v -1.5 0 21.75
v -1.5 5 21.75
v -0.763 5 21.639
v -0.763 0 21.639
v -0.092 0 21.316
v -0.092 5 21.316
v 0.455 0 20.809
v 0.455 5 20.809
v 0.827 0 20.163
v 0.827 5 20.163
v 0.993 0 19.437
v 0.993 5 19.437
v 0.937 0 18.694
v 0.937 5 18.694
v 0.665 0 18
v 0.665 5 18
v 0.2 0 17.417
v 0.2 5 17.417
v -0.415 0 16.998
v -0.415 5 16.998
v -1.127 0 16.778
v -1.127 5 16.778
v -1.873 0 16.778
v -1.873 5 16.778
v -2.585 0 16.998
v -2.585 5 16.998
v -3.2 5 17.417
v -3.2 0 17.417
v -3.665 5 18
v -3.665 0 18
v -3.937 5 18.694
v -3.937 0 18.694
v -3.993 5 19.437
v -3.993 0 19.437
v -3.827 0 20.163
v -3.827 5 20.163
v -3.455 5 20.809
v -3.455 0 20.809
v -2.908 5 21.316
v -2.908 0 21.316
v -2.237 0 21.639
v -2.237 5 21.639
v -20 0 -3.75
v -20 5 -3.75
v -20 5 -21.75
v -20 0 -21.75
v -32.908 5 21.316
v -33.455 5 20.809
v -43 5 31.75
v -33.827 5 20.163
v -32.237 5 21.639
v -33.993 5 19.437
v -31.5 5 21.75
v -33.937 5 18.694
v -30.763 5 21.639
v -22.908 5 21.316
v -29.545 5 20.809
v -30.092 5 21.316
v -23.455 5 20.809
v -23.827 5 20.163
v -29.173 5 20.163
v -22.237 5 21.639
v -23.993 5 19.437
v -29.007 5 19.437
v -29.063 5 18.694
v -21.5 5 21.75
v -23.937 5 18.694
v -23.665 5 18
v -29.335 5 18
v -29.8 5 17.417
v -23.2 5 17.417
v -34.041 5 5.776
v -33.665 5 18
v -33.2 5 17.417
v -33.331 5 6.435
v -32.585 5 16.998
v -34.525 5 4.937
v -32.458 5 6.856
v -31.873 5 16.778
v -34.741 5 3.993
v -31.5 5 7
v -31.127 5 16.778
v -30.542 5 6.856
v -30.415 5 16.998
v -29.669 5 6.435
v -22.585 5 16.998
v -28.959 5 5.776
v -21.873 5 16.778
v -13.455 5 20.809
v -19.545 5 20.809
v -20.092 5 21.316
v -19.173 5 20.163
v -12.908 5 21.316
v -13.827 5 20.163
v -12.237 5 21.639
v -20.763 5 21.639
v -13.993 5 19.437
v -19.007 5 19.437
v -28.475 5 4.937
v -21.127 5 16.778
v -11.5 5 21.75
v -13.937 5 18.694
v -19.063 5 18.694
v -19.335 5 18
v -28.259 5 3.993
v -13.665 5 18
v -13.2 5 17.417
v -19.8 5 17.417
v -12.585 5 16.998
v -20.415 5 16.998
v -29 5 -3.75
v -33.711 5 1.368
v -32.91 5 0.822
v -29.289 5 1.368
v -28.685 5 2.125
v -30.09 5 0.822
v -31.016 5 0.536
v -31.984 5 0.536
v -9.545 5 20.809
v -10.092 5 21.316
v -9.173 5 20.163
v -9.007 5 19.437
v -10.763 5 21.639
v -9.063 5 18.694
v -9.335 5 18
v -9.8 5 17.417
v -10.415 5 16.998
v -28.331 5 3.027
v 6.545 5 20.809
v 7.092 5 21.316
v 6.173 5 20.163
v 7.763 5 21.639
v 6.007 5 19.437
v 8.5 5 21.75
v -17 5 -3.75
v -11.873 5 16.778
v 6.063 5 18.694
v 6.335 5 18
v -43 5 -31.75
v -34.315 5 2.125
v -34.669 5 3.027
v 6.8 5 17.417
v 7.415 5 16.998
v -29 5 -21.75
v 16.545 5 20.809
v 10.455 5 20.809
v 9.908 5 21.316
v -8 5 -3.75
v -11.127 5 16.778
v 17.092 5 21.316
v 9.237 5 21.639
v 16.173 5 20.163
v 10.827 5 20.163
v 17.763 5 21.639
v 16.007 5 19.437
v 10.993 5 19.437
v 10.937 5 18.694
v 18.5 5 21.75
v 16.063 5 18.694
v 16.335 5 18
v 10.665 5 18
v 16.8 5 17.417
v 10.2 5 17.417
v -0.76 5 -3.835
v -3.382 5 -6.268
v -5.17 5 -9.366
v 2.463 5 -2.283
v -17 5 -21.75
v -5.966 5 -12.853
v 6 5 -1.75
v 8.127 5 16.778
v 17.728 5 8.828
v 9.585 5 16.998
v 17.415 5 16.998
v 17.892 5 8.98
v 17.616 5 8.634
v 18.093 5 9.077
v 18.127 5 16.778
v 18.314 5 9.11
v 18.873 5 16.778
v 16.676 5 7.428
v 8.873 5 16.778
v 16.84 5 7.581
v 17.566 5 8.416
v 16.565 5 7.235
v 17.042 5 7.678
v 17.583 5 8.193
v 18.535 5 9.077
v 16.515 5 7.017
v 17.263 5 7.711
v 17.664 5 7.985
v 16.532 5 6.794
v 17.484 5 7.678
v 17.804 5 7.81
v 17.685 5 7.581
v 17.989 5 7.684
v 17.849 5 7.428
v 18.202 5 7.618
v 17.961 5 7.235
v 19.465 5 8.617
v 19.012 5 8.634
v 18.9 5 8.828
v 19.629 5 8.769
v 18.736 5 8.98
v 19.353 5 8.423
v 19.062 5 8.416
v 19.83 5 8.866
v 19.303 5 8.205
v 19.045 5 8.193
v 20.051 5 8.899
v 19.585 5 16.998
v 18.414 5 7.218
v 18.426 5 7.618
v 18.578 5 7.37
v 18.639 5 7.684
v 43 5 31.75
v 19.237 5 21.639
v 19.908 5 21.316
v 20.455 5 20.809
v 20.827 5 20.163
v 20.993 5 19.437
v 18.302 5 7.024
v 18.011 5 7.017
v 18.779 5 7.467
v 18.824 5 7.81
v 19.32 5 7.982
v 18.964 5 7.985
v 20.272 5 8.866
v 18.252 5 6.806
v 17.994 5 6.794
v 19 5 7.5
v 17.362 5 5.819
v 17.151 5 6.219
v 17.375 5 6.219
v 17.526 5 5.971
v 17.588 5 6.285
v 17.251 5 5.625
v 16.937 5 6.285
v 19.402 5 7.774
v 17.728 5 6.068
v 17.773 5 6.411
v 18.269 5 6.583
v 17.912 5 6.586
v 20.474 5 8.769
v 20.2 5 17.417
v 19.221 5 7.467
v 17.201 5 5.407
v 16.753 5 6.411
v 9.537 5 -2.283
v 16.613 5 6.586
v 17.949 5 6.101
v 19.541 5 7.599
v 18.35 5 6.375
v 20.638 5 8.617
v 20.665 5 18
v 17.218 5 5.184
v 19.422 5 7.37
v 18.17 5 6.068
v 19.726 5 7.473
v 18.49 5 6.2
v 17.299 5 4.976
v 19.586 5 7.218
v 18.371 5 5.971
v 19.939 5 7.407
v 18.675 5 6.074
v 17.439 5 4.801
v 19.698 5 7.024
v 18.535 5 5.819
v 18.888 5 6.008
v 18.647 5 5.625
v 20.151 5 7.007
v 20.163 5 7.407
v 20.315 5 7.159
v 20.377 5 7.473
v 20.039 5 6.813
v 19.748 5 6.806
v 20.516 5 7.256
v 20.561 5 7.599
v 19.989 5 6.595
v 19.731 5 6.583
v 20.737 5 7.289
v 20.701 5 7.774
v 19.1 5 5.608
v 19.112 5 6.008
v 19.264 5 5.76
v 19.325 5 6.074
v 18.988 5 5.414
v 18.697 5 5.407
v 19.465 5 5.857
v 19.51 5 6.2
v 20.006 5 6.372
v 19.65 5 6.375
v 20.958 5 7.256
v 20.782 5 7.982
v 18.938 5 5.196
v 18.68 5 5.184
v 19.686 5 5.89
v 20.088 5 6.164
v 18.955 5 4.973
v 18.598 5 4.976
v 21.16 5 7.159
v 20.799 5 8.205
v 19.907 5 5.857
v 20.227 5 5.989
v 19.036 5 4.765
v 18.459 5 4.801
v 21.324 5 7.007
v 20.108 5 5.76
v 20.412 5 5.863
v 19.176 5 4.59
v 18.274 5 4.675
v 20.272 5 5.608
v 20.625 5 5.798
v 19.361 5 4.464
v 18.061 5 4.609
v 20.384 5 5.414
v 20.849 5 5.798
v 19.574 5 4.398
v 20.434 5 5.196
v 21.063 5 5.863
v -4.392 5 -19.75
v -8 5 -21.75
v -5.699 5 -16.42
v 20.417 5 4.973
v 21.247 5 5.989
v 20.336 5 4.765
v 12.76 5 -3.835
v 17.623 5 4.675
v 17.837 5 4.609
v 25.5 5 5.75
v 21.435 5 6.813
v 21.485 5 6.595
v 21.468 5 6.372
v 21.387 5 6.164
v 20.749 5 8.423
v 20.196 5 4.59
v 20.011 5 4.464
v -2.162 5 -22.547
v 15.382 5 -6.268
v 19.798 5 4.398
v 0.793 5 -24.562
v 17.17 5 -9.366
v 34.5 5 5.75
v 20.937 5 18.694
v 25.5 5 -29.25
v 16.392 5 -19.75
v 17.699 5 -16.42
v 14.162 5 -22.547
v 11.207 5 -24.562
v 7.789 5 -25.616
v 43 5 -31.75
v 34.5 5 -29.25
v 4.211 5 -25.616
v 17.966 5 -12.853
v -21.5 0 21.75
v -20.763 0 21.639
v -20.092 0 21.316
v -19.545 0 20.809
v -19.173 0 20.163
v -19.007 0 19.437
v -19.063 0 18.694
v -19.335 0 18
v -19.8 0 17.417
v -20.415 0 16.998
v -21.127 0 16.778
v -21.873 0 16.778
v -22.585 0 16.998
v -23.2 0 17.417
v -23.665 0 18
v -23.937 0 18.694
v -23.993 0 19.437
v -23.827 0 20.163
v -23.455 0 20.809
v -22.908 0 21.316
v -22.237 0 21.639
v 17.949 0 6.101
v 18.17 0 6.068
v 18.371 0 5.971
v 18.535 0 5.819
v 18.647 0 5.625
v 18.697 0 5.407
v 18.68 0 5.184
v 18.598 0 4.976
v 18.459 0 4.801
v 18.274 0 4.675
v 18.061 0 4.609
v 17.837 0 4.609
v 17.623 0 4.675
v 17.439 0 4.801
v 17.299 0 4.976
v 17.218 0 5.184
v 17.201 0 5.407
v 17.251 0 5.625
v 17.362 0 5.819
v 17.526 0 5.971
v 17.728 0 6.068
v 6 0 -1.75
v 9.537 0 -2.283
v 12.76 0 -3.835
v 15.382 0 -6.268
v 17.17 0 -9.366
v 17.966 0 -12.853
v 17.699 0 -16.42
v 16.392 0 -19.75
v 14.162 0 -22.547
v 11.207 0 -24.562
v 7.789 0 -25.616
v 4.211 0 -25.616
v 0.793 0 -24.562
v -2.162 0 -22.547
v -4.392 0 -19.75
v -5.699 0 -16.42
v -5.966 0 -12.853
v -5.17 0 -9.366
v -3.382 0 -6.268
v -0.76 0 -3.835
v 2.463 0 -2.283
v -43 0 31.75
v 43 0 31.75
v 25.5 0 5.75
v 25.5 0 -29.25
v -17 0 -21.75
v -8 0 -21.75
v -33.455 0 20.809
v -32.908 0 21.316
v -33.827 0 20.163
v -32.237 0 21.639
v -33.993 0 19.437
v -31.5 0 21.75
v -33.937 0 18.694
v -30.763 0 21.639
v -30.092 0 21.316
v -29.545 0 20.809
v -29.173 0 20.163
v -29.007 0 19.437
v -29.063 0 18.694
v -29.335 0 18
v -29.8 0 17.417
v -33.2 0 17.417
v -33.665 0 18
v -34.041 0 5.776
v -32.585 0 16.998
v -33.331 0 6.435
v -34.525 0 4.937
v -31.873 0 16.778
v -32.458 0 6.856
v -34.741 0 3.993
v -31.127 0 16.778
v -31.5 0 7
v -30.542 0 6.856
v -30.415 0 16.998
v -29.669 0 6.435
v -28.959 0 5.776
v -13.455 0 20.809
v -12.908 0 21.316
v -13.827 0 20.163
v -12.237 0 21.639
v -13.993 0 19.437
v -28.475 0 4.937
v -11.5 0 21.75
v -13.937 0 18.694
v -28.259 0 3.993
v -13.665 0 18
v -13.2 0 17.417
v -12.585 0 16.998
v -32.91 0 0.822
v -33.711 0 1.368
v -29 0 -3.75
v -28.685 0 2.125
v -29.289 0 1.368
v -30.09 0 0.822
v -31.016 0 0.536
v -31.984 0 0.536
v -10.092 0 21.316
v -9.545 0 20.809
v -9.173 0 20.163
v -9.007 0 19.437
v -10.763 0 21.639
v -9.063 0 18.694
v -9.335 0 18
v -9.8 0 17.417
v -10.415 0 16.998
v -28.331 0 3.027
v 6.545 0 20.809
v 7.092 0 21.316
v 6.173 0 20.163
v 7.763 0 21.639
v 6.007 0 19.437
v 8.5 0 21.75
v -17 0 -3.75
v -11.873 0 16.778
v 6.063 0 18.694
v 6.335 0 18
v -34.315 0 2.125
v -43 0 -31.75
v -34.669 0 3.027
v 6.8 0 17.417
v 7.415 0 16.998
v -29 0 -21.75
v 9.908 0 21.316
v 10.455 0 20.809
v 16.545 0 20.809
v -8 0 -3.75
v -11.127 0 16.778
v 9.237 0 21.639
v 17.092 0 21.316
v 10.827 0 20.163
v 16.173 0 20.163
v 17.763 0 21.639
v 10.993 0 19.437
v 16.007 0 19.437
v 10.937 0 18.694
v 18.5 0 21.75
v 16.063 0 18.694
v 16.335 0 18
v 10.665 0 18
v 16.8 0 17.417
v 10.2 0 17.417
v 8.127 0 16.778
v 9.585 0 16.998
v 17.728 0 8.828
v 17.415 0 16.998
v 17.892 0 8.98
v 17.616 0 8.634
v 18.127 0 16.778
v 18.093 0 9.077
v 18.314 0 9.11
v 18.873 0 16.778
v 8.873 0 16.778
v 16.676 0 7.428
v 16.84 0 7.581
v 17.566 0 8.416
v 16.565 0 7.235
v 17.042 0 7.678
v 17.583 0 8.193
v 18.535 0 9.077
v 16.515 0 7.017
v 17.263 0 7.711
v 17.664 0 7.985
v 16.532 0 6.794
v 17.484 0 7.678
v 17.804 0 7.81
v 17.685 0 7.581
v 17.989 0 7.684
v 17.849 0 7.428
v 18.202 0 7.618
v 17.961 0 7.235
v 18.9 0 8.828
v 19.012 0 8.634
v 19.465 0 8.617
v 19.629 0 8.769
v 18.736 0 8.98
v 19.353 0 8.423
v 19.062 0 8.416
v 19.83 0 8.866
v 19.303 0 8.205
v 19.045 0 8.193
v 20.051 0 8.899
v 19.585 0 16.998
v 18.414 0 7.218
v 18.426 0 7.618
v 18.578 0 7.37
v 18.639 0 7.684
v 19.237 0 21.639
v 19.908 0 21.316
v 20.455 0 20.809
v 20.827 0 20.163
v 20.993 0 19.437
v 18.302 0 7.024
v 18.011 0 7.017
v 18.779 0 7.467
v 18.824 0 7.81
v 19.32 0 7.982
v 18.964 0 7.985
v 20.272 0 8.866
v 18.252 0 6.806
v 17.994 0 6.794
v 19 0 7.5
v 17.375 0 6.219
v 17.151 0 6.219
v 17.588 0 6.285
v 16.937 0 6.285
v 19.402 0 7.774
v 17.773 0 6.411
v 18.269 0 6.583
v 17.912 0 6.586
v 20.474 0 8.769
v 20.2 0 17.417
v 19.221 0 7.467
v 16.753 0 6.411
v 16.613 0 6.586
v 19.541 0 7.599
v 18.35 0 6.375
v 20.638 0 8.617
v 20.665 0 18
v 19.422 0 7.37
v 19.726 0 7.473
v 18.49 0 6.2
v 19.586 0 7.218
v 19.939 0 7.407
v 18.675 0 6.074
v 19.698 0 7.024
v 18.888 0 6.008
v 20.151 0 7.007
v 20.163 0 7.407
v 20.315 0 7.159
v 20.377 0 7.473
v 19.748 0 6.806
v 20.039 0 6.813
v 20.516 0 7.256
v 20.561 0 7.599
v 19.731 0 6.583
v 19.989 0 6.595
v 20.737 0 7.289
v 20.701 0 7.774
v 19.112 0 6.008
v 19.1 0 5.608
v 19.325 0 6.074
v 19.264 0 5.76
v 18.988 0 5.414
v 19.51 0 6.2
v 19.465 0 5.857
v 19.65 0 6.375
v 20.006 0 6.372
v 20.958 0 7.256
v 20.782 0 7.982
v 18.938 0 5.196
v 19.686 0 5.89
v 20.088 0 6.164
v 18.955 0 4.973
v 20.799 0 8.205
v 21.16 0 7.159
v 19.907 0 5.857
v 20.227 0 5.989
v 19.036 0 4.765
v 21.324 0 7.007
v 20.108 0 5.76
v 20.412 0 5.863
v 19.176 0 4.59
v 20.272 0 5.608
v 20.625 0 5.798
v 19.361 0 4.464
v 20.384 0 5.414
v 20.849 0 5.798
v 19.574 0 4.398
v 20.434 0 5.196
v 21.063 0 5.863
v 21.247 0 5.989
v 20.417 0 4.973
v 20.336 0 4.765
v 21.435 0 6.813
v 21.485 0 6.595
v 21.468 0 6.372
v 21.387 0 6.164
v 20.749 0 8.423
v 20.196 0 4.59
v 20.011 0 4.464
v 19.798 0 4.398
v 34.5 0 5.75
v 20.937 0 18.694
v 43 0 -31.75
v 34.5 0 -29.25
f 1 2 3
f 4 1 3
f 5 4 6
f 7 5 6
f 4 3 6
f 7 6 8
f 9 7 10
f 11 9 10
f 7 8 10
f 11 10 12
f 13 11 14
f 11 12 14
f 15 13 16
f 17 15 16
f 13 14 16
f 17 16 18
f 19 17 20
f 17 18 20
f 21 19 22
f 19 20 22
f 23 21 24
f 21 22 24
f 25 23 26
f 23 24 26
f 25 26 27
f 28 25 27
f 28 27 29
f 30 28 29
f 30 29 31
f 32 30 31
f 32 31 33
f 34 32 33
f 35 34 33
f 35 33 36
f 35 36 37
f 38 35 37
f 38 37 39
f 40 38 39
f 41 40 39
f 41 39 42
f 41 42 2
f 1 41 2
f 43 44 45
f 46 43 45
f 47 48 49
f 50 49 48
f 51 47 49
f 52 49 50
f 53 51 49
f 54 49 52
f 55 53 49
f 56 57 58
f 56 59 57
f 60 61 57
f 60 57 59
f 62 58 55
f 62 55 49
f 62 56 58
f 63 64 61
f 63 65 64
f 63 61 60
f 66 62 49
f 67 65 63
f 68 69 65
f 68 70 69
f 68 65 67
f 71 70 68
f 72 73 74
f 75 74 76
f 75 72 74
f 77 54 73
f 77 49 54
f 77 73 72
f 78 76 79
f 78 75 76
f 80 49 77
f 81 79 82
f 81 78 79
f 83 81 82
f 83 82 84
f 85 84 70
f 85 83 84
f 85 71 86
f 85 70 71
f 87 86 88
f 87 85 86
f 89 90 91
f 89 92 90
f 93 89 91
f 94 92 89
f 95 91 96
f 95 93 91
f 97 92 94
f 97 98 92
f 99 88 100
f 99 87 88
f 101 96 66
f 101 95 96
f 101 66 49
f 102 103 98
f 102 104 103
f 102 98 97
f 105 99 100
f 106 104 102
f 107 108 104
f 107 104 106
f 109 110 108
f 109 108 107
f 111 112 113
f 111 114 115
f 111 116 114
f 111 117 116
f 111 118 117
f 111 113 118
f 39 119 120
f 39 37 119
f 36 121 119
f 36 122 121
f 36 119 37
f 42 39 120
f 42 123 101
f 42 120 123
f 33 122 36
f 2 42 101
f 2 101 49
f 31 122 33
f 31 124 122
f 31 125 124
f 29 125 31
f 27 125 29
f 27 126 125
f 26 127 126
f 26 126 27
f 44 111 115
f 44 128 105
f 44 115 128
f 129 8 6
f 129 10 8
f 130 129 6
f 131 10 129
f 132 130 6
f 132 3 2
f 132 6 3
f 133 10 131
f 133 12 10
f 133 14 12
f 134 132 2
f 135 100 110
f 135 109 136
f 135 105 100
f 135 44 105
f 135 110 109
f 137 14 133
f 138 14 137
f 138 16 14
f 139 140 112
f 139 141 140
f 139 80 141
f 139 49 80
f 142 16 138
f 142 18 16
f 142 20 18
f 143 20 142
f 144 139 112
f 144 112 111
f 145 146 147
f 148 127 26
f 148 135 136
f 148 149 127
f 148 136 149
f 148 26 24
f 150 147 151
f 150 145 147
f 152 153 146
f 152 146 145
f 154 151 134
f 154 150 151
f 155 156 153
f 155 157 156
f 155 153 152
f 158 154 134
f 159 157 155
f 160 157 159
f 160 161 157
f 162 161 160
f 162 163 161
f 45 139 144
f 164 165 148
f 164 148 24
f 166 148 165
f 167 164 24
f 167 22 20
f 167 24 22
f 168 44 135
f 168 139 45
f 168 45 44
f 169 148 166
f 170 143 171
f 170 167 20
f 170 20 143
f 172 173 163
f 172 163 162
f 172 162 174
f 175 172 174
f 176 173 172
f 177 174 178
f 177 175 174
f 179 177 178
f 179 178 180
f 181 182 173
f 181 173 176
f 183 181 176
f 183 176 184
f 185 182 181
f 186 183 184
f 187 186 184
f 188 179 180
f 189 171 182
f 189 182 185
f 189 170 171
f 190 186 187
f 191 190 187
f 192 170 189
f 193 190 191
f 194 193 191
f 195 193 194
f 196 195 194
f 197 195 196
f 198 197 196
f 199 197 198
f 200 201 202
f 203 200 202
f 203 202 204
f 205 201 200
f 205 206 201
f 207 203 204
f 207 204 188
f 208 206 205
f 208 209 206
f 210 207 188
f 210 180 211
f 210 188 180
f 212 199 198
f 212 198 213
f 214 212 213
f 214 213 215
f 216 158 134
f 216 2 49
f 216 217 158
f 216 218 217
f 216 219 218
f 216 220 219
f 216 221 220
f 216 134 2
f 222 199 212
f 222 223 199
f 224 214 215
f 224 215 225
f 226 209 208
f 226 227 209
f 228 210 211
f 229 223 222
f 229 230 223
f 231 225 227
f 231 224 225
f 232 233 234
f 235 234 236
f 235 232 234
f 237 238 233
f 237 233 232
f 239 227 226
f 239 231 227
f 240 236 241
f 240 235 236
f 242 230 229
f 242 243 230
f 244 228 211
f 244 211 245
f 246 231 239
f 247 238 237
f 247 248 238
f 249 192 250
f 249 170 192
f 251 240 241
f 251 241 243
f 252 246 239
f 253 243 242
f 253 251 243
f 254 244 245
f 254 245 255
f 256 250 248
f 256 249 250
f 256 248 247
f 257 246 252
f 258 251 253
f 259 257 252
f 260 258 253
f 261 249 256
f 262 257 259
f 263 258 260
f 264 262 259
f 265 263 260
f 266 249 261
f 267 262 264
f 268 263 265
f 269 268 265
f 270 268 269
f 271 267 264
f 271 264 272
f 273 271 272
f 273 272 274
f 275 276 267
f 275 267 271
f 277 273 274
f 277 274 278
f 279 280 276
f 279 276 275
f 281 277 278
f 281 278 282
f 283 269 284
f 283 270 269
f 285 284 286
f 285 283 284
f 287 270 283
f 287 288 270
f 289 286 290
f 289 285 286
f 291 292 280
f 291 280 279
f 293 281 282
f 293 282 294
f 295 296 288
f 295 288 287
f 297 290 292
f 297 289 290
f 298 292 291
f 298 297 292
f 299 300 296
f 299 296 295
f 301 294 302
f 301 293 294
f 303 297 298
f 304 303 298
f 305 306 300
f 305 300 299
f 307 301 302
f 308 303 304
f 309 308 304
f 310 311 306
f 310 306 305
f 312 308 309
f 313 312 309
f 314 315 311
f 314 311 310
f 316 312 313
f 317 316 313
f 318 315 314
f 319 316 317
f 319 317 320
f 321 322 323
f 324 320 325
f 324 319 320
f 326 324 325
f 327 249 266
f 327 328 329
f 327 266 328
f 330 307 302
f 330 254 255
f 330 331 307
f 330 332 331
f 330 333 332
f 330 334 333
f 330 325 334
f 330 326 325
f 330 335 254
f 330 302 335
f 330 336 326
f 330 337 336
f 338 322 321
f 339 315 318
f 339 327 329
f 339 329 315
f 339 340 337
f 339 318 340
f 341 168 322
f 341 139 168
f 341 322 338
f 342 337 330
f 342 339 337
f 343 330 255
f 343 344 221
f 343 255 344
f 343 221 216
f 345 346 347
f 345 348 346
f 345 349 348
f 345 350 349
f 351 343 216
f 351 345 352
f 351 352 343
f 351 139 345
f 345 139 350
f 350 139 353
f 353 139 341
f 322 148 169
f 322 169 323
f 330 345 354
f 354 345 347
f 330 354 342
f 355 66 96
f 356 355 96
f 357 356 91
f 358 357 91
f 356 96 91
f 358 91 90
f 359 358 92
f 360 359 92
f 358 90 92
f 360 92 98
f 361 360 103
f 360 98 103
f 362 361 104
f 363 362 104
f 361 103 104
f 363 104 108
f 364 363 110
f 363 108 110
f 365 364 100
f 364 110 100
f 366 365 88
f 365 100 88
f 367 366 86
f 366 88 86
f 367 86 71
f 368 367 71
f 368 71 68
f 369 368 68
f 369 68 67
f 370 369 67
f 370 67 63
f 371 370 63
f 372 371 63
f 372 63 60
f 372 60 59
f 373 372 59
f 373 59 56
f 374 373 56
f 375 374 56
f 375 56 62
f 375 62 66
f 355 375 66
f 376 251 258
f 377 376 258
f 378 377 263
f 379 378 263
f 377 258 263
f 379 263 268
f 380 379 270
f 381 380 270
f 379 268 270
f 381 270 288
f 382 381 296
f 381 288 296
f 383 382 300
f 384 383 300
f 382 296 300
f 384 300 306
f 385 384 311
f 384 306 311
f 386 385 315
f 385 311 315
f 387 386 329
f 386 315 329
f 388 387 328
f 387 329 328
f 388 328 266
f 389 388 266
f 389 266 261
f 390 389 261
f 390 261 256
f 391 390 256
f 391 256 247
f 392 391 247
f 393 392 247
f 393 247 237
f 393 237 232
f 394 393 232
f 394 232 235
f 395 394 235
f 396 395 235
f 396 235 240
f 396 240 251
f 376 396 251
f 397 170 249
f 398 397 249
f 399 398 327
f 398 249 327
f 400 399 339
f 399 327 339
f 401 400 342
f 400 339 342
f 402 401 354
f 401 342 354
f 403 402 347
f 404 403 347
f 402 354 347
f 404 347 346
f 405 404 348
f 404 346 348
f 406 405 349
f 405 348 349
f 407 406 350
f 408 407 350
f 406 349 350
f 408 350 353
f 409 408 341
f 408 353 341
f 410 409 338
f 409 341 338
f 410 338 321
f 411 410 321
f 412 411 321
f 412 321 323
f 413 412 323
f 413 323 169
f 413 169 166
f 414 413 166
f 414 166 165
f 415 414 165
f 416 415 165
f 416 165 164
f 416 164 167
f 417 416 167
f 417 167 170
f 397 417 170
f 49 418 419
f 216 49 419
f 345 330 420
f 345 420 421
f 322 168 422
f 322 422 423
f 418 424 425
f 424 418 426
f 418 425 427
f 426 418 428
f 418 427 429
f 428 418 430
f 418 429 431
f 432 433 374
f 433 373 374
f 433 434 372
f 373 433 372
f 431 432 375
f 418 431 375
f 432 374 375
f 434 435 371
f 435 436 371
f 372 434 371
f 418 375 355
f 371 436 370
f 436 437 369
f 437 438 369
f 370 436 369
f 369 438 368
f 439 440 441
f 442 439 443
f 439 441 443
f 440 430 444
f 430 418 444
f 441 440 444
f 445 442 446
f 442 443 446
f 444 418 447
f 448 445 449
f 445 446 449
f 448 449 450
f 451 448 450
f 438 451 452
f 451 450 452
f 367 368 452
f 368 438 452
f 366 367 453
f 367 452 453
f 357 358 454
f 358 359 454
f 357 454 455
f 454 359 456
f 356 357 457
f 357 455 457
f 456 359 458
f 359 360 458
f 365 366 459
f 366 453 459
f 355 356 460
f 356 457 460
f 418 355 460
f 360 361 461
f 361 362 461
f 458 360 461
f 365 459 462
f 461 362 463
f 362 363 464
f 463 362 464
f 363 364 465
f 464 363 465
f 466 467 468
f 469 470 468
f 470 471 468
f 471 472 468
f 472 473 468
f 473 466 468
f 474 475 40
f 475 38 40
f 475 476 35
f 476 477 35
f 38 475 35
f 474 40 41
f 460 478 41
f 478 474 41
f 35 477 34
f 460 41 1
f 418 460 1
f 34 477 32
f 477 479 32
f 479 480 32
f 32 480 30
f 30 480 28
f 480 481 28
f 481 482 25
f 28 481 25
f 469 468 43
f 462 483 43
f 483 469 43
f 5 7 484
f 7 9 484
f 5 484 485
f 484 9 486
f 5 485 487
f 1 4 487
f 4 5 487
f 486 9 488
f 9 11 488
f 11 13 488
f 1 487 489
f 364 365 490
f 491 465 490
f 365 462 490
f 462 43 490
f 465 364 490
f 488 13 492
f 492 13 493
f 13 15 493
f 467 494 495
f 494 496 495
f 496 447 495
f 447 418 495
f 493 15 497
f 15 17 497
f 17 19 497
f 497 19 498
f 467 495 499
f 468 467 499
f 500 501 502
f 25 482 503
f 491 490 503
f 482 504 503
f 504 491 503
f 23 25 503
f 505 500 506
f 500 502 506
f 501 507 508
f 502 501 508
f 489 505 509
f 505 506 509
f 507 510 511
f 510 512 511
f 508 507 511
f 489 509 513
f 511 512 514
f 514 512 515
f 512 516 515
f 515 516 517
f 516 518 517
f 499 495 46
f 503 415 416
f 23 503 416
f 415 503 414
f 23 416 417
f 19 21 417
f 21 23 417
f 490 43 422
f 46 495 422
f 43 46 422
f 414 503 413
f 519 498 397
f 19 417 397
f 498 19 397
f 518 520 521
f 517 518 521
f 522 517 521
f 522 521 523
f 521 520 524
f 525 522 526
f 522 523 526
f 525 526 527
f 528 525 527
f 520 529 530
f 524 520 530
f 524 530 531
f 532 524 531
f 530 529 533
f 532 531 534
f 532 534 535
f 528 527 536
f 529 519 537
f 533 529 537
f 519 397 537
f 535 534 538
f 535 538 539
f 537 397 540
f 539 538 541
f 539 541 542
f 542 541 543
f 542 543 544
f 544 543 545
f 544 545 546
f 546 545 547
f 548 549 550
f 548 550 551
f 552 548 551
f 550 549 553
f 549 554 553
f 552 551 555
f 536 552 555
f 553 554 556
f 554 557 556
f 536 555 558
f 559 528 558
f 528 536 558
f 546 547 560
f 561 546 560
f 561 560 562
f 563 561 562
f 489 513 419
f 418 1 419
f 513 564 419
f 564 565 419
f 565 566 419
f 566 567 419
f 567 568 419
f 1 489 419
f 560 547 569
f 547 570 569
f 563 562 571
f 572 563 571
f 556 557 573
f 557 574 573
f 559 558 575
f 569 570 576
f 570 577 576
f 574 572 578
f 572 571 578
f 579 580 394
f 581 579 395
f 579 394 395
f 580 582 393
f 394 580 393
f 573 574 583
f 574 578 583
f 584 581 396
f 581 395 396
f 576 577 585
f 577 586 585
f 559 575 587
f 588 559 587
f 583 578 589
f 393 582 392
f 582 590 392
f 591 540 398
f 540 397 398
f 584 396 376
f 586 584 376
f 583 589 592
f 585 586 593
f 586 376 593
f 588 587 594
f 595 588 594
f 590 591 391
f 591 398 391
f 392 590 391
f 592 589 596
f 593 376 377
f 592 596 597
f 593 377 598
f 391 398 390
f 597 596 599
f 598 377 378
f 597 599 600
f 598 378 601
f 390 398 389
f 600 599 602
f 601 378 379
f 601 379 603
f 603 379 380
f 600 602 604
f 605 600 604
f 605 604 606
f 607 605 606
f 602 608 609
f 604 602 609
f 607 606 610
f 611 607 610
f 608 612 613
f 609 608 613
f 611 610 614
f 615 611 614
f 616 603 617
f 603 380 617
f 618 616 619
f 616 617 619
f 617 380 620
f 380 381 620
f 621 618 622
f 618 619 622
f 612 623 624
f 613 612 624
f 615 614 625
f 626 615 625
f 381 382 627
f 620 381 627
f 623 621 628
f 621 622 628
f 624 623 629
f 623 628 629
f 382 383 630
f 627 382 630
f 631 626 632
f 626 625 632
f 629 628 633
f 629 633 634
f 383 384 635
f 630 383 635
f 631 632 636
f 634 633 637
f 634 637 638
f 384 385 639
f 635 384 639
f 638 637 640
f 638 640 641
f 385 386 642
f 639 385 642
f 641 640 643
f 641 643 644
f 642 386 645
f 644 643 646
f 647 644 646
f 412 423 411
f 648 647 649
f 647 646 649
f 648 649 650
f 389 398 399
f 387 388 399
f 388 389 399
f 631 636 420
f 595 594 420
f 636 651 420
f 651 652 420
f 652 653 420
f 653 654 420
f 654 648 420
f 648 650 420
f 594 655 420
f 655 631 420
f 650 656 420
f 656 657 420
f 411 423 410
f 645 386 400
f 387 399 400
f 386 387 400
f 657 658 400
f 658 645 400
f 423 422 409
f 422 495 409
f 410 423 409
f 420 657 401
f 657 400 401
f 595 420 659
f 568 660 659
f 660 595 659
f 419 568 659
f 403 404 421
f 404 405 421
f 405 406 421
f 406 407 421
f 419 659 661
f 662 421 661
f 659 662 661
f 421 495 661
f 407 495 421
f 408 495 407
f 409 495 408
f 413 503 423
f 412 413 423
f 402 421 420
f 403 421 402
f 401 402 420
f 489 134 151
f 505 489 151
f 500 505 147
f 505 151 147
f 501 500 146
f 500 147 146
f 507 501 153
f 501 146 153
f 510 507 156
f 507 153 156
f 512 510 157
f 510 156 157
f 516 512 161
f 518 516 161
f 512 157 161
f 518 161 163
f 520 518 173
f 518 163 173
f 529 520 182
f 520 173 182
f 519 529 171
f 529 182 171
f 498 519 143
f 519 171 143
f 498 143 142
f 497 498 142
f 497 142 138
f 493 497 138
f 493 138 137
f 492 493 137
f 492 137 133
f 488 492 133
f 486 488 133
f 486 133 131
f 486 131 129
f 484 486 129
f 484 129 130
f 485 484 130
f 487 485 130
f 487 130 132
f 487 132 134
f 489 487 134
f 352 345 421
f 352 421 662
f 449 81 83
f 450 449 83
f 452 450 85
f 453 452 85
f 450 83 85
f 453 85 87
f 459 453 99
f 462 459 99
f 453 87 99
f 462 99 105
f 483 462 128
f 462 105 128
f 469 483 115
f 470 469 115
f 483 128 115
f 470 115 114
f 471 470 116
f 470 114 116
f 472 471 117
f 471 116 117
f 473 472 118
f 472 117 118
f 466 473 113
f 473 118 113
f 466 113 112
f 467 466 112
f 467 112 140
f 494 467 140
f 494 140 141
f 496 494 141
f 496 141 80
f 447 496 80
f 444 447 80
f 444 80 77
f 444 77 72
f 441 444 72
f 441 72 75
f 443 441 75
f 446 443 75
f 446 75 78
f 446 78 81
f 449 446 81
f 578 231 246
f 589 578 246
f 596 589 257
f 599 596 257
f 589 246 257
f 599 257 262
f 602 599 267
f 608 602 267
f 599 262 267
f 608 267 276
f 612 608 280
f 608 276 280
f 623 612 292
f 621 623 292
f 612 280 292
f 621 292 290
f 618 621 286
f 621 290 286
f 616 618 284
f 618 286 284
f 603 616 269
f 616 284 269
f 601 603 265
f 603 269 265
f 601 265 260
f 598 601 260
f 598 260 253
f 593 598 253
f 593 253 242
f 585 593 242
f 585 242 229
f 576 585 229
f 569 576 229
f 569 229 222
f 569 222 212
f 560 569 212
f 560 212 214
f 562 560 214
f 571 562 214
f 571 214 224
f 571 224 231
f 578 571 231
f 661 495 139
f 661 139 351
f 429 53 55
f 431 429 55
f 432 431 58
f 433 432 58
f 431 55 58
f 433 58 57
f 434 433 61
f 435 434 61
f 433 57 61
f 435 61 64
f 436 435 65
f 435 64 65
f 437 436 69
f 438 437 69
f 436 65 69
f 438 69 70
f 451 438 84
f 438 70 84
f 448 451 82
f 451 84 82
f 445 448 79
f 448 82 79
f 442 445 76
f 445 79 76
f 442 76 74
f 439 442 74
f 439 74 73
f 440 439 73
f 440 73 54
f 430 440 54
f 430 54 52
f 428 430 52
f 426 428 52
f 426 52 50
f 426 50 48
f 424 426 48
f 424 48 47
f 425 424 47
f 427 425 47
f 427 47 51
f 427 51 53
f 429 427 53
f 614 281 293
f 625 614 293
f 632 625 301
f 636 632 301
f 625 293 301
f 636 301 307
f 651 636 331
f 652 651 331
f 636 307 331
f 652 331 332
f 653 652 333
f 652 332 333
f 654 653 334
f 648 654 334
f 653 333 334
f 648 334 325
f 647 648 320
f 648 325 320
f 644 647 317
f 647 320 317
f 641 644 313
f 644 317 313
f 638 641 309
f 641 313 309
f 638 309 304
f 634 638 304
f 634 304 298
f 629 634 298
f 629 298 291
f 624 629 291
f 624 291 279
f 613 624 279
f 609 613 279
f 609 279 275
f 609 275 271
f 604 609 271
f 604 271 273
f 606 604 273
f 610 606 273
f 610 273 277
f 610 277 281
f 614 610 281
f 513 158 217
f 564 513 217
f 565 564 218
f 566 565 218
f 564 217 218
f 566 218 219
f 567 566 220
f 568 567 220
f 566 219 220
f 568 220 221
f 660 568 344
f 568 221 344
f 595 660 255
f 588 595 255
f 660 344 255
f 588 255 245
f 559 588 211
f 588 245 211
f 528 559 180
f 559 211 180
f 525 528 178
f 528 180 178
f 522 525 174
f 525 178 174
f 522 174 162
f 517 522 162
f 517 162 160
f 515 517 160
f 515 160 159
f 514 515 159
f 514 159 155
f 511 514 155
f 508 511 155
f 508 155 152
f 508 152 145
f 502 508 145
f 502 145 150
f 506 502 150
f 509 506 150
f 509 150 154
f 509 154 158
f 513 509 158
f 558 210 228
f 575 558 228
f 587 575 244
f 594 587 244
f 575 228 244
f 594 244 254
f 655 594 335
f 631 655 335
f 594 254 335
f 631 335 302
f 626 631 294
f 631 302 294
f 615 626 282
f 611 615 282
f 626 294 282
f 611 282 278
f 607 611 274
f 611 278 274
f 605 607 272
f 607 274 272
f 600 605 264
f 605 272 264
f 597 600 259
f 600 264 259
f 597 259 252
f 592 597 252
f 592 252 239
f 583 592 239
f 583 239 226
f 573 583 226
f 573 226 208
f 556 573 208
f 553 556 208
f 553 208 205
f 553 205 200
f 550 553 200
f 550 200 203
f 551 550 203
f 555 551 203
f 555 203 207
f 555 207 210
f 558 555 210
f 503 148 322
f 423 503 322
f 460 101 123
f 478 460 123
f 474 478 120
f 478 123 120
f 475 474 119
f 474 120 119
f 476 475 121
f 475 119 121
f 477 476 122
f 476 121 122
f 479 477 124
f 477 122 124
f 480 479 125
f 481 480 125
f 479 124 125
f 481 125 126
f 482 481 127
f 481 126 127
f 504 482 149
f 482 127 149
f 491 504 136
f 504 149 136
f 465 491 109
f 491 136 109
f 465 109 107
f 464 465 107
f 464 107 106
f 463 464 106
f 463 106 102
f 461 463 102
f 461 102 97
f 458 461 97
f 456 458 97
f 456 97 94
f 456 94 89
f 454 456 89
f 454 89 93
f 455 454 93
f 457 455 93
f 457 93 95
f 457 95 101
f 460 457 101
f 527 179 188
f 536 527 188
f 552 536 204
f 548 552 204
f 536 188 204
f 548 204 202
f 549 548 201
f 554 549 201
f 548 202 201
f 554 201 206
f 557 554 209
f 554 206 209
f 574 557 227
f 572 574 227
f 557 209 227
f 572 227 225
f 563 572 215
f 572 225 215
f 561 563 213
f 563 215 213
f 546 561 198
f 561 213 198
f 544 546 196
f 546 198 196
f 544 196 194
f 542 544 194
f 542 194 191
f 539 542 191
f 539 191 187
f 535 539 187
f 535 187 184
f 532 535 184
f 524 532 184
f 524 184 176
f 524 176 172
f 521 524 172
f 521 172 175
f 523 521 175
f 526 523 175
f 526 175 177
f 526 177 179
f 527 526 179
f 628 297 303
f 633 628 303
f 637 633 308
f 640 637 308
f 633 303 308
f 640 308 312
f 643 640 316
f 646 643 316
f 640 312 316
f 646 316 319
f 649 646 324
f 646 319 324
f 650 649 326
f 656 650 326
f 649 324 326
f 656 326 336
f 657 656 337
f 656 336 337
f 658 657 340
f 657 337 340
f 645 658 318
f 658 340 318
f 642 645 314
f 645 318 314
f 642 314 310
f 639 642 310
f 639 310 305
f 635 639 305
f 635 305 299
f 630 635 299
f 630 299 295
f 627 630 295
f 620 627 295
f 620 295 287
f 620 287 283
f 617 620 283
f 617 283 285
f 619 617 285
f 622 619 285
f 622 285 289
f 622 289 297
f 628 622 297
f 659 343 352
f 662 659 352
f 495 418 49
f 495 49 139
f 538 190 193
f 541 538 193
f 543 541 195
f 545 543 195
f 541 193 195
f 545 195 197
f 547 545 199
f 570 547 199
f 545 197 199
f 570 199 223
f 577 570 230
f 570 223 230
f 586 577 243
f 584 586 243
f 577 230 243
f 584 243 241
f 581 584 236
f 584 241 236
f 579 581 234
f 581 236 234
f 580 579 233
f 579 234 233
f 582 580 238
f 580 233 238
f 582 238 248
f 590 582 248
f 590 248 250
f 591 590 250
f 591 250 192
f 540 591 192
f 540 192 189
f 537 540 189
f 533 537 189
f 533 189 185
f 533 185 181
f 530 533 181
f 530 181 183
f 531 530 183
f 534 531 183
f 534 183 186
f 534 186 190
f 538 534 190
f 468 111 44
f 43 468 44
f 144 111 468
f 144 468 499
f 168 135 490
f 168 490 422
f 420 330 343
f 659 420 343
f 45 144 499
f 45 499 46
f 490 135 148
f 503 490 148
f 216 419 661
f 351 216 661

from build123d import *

# Parameters (mm, degrees)
SKICA2_W                 = 86
SKICA2_H                 = 63.5
P_IDAT_VYSUNUT_M1_DEPTH  = 5
ODEBRAT_VYSUNUT_M1_REACH = 55.685
SKICA4_R                 = 2.5
SKICA4_R_2               = 3.25
SKICA4_R_3               = 12
SKICA4_R_4               = 0.75
SKICA4_W                 = 9
SKICA4_H                 = 18
SKICA4_H_2               = 35


with BuildPart() as part:
    # Skica2 → Přidat vysunutím1 (new body)
    with BuildSketch(Plane(origin=(0, 0, 0), x_dir=(1, 0, 0), z_dir=(0, 1, 0))):
        Rectangle(SKICA2_W, SKICA2_H)
    extrude(amount=P_IDAT_VYSUNUT_M1_DEPTH)

    # Skica4 → Odebrat vysunutím1 (cut, up to next)
    with BuildSketch(Plane(origin=(0, 5, 0), x_dir=(1, 0, 0), z_dir=(0, 1, 0)), mode=Mode.PRIVATE) as odebrat_vysunut_m1_sk1:
        with Locations(Location((-31.5, -19.25, 0), (0, 0, 270))):
            Circle(SKICA4_R)
    odebrat_vysunut_m1_tool1 = extrude(odebrat_vysunut_m1_sk1.sketch, amount=-ODEBRAT_VYSUNUT_M1_REACH, mode=Mode.PRIVATE) & part.part
    # Skica4 → Odebrat vysunutím1 (cut, up to next)
    with BuildSketch(Plane(origin=(0, 5, 0), x_dir=(1, 0, 0), z_dir=(0, 1, 0)), mode=Mode.PRIVATE) as odebrat_vysunut_m1_sk2:
        with Locations(Location((-21.5, -19.25, 0), (0, 0, 270))):
            Circle(SKICA4_R)
    odebrat_vysunut_m1_tool2 = extrude(odebrat_vysunut_m1_sk2.sketch, amount=-ODEBRAT_VYSUNUT_M1_REACH, mode=Mode.PRIVATE) & part.part
    # Skica4 → Odebrat vysunutím1 (cut, up to next)
    with BuildSketch(Plane(origin=(0, 5, 0), x_dir=(1, 0, 0), z_dir=(0, 1, 0)), mode=Mode.PRIVATE) as odebrat_vysunut_m1_sk3:
        with Locations(Location((-11.5, -19.25, 0), (0, 0, 270))):
            Circle(SKICA4_R)
    odebrat_vysunut_m1_tool3 = extrude(odebrat_vysunut_m1_sk3.sketch, amount=-ODEBRAT_VYSUNUT_M1_REACH, mode=Mode.PRIVATE) & part.part
    # Skica4 → Odebrat vysunutím1 (cut, up to next)
    with BuildSketch(Plane(origin=(0, 5, 0), x_dir=(1, 0, 0), z_dir=(0, 1, 0)), mode=Mode.PRIVATE) as odebrat_vysunut_m1_sk4:
        with Locations(Location((-1.5, -19.25, 0), (0, 0, 270))):
            Circle(SKICA4_R)
    odebrat_vysunut_m1_tool4 = extrude(odebrat_vysunut_m1_sk4.sketch, amount=-ODEBRAT_VYSUNUT_M1_REACH, mode=Mode.PRIVATE) & part.part
    # Skica4 → Odebrat vysunutím1 (cut, up to next)
    with BuildSketch(Plane(origin=(0, 5, 0), x_dir=(1, 0, 0), z_dir=(0, 1, 0)), mode=Mode.PRIVATE) as odebrat_vysunut_m1_sk5:
        with Locations(Location((8.5, -19.25, 0), (0, 0, 270))):
            Circle(SKICA4_R)
    odebrat_vysunut_m1_tool5 = extrude(odebrat_vysunut_m1_sk5.sketch, amount=-ODEBRAT_VYSUNUT_M1_REACH, mode=Mode.PRIVATE) & part.part
    # Skica4 → Odebrat vysunutím1 (cut, up to next)
    with BuildSketch(Plane(origin=(0, 5, 0), x_dir=(1, 0, 0), z_dir=(0, 1, 0)), mode=Mode.PRIVATE) as odebrat_vysunut_m1_sk6:
        with Locations(Location((18.5, -19.25, 0), (0, 0, 270))):
            Circle(SKICA4_R)
    odebrat_vysunut_m1_tool6 = extrude(odebrat_vysunut_m1_sk6.sketch, amount=-ODEBRAT_VYSUNUT_M1_REACH, mode=Mode.PRIVATE) & part.part
    # Skica4 → Odebrat vysunutím1 (cut, up to next)
    with BuildSketch(Plane(origin=(0, 5, 0), x_dir=(1, 0, 0), z_dir=(0, 1, 0)), mode=Mode.PRIVATE) as odebrat_vysunut_m1_sk7:
        with Locations(Location((-31.5, -3.75, 0), (0, 0, 270))):
            Circle(SKICA4_R_2)
    odebrat_vysunut_m1_tool7 = extrude(odebrat_vysunut_m1_sk7.sketch, amount=-ODEBRAT_VYSUNUT_M1_REACH, mode=Mode.PRIVATE) & part.part
    # Skica4 → Odebrat vysunutím1 (cut, up to next)
    with BuildSketch(Plane(origin=(0, 5, 0), x_dir=(1, 0, 0), z_dir=(0, 1, 0)), mode=Mode.PRIVATE) as odebrat_vysunut_m1_sk8:
        with Locations(Location((6, 13.75, 0), (0, 0, 270))):
            Circle(SKICA4_R_3)
    odebrat_vysunut_m1_tool8 = extrude(odebrat_vysunut_m1_sk8.sketch, amount=-ODEBRAT_VYSUNUT_M1_REACH, mode=Mode.PRIVATE) & part.part
    # Skica4 → Odebrat vysunutím1 (cut, up to next)
    with BuildSketch(Plane(origin=(0, 5, 0), x_dir=(1, 0, 0), z_dir=(0, 1, 0)), mode=Mode.PRIVATE) as odebrat_vysunut_m1_sk9:
        with Locations(Location((17.948758431, -5.350932037, 0), (0, 0, 270))):
            Circle(SKICA4_R_4)
    odebrat_vysunut_m1_tool9 = extrude(odebrat_vysunut_m1_sk9.sketch, amount=-ODEBRAT_VYSUNUT_M1_REACH, mode=Mode.PRIVATE) & part.part
    # Skica4 → Odebrat vysunutím1 (cut, up to next)
    with BuildSketch(Plane(origin=(0, 5, 0), x_dir=(1, 0, 0), z_dir=(0, 1, 0)), mode=Mode.PRIVATE) as odebrat_vysunut_m1_sk10:
        with Locations(Location((19, -6.75, 0), (0, 0, 270))):
            Circle(SKICA4_R_4)
    odebrat_vysunut_m1_tool10 = extrude(odebrat_vysunut_m1_sk10.sketch, amount=-ODEBRAT_VYSUNUT_M1_REACH, mode=Mode.PRIVATE) & part.part
    # Skica4 → Odebrat vysunutím1 (cut, up to next)
    with BuildSketch(Plane(origin=(0, 5, 0), x_dir=(1, 0, 0), z_dir=(0, 1, 0)), mode=Mode.PRIVATE) as odebrat_vysunut_m1_sk11:
        with Locations(Location((19.686007584, -5.140064137, 0), (0, 0, 270))):
            Circle(SKICA4_R_4)
    odebrat_vysunut_m1_tool11 = extrude(odebrat_vysunut_m1_sk11.sketch, amount=-ODEBRAT_VYSUNUT_M1_REACH, mode=Mode.PRIVATE) & part.part
    # Skica4 → Odebrat vysunutím1 (cut, up to next)
    with BuildSketch(Plane(origin=(0, 5, 0), x_dir=(1, 0, 0), z_dir=(0, 1, 0)), mode=Mode.PRIVATE) as odebrat_vysunut_m1_sk12:
        with Locations(Location((20.737249118, -6.539132085, 0), (0, 0, 270))):
            Circle(SKICA4_R_4)
    odebrat_vysunut_m1_tool12 = extrude(odebrat_vysunut_m1_sk12.sketch, amount=-ODEBRAT_VYSUNUT_M1_REACH, mode=Mode.PRIVATE) & part.part
    # Skica4 → Odebrat vysunutím1 (cut, up to next)
    with BuildSketch(Plane(origin=(0, 5, 0), x_dir=(1, 0, 0), z_dir=(0, 1, 0)), mode=Mode.PRIVATE) as odebrat_vysunut_m1_sk13:
        with Locations(Location((20.051241501, -8.149067934, 0), (0, 0, 270))):
            Circle(SKICA4_R_4)
    odebrat_vysunut_m1_tool13 = extrude(odebrat_vysunut_m1_sk13.sketch, amount=-ODEBRAT_VYSUNUT_M1_REACH, mode=Mode.PRIVATE) & part.part
    # Skica4 → Odebrat vysunutím1 (cut, up to next)
    with BuildSketch(Plane(origin=(0, 5, 0), x_dir=(1, 0, 0), z_dir=(0, 1, 0)), mode=Mode.PRIVATE) as odebrat_vysunut_m1_sk14:
        with Locations(Location((18.313992349, -8.359935834, 0), (0, 0, 270))):
            Circle(SKICA4_R_4)
    odebrat_vysunut_m1_tool14 = extrude(odebrat_vysunut_m1_sk14.sketch, amount=-ODEBRAT_VYSUNUT_M1_REACH, mode=Mode.PRIVATE) & part.part
    # Skica4 → Odebrat vysunutím1 (cut, up to next)
    with BuildSketch(Plane(origin=(0, 5, 0), x_dir=(1, 0, 0), z_dir=(0, 1, 0)), mode=Mode.PRIVATE) as odebrat_vysunut_m1_sk15:
        with Locations(Location((17.262750814, -6.960867886, 0), (0, 0, 270))):
            Circle(SKICA4_R_4)
    odebrat_vysunut_m1_tool15 = extrude(odebrat_vysunut_m1_sk15.sketch, amount=-ODEBRAT_VYSUNUT_M1_REACH, mode=Mode.PRIVATE) & part.part
    # Skica4 → Odebrat vysunutím1 (cut, up to next)
    with BuildSketch(Plane(origin=(0, 5, 0), x_dir=(1, 0, 0), z_dir=(0, 1, 0)), mode=Mode.PRIVATE) as odebrat_vysunut_m1_sk16:
        with Locations((-24.5, 12.75)):
            Rectangle(SKICA4_W, SKICA4_H)
    odebrat_vysunut_m1_tool16 = extrude(odebrat_vysunut_m1_sk16.sketch, amount=-ODEBRAT_VYSUNUT_M1_REACH, mode=Mode.PRIVATE) & part.part
    # Skica4 → Odebrat vysunutím1 (cut, up to next)
    with BuildSketch(Plane(origin=(0, 5, 0), x_dir=(1, 0, 0), z_dir=(0, 1, 0)), mode=Mode.PRIVATE) as odebrat_vysunut_m1_sk17:
        with Locations((-12.5, 12.75)):
            Rectangle(SKICA4_W, SKICA4_H)
    odebrat_vysunut_m1_tool17 = extrude(odebrat_vysunut_m1_sk17.sketch, amount=-ODEBRAT_VYSUNUT_M1_REACH, mode=Mode.PRIVATE) & part.part
    # Skica4 → Odebrat vysunutím1 (cut, up to next)
    with BuildSketch(Plane(origin=(0, 5, 0), x_dir=(1, 0, 0), z_dir=(0, 1, 0)), mode=Mode.PRIVATE) as odebrat_vysunut_m1_sk18:
        with Locations((30, 11.75)):
            Rectangle(SKICA4_W, SKICA4_H_2)
    odebrat_vysunut_m1_tool18 = extrude(odebrat_vysunut_m1_sk18.sketch, amount=-ODEBRAT_VYSUNUT_M1_REACH, mode=Mode.PRIVATE) & part.part
    add(odebrat_vysunut_m1_tool1.solids().sort_by_distance((-31.5, 5, 19.25))[0], mode=Mode.SUBTRACT)
    add(odebrat_vysunut_m1_tool2.solids().sort_by_distance((-21.5, 5, 19.25))[0], mode=Mode.SUBTRACT)
    add(odebrat_vysunut_m1_tool3.solids().sort_by_distance((-11.5, 5, 19.25))[0], mode=Mode.SUBTRACT)
    add(odebrat_vysunut_m1_tool4.solids().sort_by_distance((-1.5, 5, 19.25))[0], mode=Mode.SUBTRACT)
    add(odebrat_vysunut_m1_tool5.solids().sort_by_distance((8.5, 5, 19.25))[0], mode=Mode.SUBTRACT)
    add(odebrat_vysunut_m1_tool6.solids().sort_by_distance((18.5, 5, 19.25))[0], mode=Mode.SUBTRACT)
    add(odebrat_vysunut_m1_tool7.solids().sort_by_distance((-31.5, 5, 3.75))[0], mode=Mode.SUBTRACT)
    add(odebrat_vysunut_m1_tool8.solids().sort_by_distance((6, 5, -13.75))[0], mode=Mode.SUBTRACT)
    add(odebrat_vysunut_m1_tool9.solids().sort_by_distance((17.948758, 5, 5.350932))[0], mode=Mode.SUBTRACT)
    add(odebrat_vysunut_m1_tool10.solids().sort_by_distance((19, 5, 6.75))[0], mode=Mode.SUBTRACT)
    add(odebrat_vysunut_m1_tool11.solids().sort_by_distance((19.686008, 5, 5.140064))[0], mode=Mode.SUBTRACT)
    add(odebrat_vysunut_m1_tool12.solids().sort_by_distance((20.737249, 5, 6.539132))[0], mode=Mode.SUBTRACT)
    add(odebrat_vysunut_m1_tool13.solids().sort_by_distance((20.051242, 5, 8.149068))[0], mode=Mode.SUBTRACT)
    add(odebrat_vysunut_m1_tool14.solids().sort_by_distance((18.313992, 5, 8.359936))[0], mode=Mode.SUBTRACT)
    add(odebrat_vysunut_m1_tool15.solids().sort_by_distance((17.262751, 5, 6.960868))[0], mode=Mode.SUBTRACT)
    add(odebrat_vysunut_m1_tool16.solids().sort_by_distance((-24.5, 5, -12.75))[0], mode=Mode.SUBTRACT)
    add(odebrat_vysunut_m1_tool17.solids().sort_by_distance((-12.5, 5, -12.75))[0], mode=Mode.SUBTRACT)
    add(odebrat_vysunut_m1_tool18.solids().sort_by_distance((30, 5, -11.75))[0], mode=Mode.SUBTRACT)


solid = part.part
